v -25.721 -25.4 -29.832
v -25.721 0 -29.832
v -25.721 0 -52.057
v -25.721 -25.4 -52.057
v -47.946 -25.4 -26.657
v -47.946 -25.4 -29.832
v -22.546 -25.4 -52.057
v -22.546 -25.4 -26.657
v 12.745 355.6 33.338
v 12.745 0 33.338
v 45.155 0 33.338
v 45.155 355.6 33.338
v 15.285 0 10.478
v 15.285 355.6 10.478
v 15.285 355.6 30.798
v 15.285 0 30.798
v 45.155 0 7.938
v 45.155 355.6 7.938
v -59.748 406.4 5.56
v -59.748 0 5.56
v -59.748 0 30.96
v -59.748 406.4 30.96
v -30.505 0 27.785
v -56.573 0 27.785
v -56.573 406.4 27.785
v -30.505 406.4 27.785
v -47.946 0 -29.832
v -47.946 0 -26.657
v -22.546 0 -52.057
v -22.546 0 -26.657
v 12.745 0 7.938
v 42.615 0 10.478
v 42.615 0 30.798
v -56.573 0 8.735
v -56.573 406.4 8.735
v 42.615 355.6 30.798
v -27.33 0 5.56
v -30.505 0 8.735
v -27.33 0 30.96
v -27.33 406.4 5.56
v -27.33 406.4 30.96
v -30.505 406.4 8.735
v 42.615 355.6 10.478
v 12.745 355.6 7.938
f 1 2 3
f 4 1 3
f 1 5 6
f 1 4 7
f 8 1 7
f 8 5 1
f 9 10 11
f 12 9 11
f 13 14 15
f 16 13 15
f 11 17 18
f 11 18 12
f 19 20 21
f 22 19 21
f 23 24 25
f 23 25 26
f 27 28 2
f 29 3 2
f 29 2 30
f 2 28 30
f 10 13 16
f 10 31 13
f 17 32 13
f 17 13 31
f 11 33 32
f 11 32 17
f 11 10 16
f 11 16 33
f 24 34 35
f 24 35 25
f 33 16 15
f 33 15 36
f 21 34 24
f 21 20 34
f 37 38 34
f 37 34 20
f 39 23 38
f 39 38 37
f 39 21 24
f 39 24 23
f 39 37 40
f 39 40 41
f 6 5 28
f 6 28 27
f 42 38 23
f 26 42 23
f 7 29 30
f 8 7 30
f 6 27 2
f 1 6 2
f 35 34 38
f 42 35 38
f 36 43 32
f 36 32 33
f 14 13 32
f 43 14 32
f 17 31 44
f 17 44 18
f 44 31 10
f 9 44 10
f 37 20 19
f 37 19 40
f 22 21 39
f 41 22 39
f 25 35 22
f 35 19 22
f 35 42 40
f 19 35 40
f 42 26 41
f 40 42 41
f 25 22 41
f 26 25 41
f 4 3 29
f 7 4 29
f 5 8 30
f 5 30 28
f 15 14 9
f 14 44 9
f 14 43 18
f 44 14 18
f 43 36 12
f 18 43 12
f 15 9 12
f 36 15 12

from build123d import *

# Parameters (mm, degrees)
F0_W     = 32.418659
F0_H     = 25.4
F1_DEPTH = 406.4
F2_T     = -3.175
F3_W     = 32.4104
F3_H     = 25.4
F4_DEPTH = 355.6
F5_T     = -2.54
F7_DEPTH = 25.4


with BuildPart() as f1:
    # F0 (on Front) → F1 (new body)
    with BuildSketch(Plane.XZ):
        with Locations((-43.53901, 18.260177)):
            Rectangle(F0_W, F0_H)
    extrude(amount=-F1_DEPTH)

    # F2
    f2_openings = [f1.faces().sort_by_distance(p)[0] for p in [
        (-43.539011, 0, 18.260177),
        (-43.539011, 406.4, 18.260177),
    ]]
    offset(amount=F2_T, openings=f2_openings)


with BuildPart() as f4:
    # F3 (on Front) → F4 (new body)
    with BuildSketch(Plane.XZ):
        with Locations((28.950076, 20.637547)):
            Rectangle(F3_W, F3_H)
    extrude(amount=-F4_DEPTH)

    # F5
    f5_openings = [f4.faces().sort_by_distance(p)[0] for p in [
        (28.950076, 0, 20.637547),
        (28.950076, 355.6, 20.637547),
    ]]
    offset(amount=F5_T, openings=f5_openings)


with BuildPart() as f7:
    # F6 (on Front) → F7 (new body)
    with BuildSketch(Plane.XZ):
        Polygon((-22.545867, -26.656636), (-47.945867, -26.656636), (-47.945867, -29.831636), (-25.720867, -29.831636), (-25.720867, -52.056636), (-22.545867, -52.056636), align=None)
    extrude(amount=F7_DEPTH)


solid = Compound([f1.part, f4.part, f7.part])
